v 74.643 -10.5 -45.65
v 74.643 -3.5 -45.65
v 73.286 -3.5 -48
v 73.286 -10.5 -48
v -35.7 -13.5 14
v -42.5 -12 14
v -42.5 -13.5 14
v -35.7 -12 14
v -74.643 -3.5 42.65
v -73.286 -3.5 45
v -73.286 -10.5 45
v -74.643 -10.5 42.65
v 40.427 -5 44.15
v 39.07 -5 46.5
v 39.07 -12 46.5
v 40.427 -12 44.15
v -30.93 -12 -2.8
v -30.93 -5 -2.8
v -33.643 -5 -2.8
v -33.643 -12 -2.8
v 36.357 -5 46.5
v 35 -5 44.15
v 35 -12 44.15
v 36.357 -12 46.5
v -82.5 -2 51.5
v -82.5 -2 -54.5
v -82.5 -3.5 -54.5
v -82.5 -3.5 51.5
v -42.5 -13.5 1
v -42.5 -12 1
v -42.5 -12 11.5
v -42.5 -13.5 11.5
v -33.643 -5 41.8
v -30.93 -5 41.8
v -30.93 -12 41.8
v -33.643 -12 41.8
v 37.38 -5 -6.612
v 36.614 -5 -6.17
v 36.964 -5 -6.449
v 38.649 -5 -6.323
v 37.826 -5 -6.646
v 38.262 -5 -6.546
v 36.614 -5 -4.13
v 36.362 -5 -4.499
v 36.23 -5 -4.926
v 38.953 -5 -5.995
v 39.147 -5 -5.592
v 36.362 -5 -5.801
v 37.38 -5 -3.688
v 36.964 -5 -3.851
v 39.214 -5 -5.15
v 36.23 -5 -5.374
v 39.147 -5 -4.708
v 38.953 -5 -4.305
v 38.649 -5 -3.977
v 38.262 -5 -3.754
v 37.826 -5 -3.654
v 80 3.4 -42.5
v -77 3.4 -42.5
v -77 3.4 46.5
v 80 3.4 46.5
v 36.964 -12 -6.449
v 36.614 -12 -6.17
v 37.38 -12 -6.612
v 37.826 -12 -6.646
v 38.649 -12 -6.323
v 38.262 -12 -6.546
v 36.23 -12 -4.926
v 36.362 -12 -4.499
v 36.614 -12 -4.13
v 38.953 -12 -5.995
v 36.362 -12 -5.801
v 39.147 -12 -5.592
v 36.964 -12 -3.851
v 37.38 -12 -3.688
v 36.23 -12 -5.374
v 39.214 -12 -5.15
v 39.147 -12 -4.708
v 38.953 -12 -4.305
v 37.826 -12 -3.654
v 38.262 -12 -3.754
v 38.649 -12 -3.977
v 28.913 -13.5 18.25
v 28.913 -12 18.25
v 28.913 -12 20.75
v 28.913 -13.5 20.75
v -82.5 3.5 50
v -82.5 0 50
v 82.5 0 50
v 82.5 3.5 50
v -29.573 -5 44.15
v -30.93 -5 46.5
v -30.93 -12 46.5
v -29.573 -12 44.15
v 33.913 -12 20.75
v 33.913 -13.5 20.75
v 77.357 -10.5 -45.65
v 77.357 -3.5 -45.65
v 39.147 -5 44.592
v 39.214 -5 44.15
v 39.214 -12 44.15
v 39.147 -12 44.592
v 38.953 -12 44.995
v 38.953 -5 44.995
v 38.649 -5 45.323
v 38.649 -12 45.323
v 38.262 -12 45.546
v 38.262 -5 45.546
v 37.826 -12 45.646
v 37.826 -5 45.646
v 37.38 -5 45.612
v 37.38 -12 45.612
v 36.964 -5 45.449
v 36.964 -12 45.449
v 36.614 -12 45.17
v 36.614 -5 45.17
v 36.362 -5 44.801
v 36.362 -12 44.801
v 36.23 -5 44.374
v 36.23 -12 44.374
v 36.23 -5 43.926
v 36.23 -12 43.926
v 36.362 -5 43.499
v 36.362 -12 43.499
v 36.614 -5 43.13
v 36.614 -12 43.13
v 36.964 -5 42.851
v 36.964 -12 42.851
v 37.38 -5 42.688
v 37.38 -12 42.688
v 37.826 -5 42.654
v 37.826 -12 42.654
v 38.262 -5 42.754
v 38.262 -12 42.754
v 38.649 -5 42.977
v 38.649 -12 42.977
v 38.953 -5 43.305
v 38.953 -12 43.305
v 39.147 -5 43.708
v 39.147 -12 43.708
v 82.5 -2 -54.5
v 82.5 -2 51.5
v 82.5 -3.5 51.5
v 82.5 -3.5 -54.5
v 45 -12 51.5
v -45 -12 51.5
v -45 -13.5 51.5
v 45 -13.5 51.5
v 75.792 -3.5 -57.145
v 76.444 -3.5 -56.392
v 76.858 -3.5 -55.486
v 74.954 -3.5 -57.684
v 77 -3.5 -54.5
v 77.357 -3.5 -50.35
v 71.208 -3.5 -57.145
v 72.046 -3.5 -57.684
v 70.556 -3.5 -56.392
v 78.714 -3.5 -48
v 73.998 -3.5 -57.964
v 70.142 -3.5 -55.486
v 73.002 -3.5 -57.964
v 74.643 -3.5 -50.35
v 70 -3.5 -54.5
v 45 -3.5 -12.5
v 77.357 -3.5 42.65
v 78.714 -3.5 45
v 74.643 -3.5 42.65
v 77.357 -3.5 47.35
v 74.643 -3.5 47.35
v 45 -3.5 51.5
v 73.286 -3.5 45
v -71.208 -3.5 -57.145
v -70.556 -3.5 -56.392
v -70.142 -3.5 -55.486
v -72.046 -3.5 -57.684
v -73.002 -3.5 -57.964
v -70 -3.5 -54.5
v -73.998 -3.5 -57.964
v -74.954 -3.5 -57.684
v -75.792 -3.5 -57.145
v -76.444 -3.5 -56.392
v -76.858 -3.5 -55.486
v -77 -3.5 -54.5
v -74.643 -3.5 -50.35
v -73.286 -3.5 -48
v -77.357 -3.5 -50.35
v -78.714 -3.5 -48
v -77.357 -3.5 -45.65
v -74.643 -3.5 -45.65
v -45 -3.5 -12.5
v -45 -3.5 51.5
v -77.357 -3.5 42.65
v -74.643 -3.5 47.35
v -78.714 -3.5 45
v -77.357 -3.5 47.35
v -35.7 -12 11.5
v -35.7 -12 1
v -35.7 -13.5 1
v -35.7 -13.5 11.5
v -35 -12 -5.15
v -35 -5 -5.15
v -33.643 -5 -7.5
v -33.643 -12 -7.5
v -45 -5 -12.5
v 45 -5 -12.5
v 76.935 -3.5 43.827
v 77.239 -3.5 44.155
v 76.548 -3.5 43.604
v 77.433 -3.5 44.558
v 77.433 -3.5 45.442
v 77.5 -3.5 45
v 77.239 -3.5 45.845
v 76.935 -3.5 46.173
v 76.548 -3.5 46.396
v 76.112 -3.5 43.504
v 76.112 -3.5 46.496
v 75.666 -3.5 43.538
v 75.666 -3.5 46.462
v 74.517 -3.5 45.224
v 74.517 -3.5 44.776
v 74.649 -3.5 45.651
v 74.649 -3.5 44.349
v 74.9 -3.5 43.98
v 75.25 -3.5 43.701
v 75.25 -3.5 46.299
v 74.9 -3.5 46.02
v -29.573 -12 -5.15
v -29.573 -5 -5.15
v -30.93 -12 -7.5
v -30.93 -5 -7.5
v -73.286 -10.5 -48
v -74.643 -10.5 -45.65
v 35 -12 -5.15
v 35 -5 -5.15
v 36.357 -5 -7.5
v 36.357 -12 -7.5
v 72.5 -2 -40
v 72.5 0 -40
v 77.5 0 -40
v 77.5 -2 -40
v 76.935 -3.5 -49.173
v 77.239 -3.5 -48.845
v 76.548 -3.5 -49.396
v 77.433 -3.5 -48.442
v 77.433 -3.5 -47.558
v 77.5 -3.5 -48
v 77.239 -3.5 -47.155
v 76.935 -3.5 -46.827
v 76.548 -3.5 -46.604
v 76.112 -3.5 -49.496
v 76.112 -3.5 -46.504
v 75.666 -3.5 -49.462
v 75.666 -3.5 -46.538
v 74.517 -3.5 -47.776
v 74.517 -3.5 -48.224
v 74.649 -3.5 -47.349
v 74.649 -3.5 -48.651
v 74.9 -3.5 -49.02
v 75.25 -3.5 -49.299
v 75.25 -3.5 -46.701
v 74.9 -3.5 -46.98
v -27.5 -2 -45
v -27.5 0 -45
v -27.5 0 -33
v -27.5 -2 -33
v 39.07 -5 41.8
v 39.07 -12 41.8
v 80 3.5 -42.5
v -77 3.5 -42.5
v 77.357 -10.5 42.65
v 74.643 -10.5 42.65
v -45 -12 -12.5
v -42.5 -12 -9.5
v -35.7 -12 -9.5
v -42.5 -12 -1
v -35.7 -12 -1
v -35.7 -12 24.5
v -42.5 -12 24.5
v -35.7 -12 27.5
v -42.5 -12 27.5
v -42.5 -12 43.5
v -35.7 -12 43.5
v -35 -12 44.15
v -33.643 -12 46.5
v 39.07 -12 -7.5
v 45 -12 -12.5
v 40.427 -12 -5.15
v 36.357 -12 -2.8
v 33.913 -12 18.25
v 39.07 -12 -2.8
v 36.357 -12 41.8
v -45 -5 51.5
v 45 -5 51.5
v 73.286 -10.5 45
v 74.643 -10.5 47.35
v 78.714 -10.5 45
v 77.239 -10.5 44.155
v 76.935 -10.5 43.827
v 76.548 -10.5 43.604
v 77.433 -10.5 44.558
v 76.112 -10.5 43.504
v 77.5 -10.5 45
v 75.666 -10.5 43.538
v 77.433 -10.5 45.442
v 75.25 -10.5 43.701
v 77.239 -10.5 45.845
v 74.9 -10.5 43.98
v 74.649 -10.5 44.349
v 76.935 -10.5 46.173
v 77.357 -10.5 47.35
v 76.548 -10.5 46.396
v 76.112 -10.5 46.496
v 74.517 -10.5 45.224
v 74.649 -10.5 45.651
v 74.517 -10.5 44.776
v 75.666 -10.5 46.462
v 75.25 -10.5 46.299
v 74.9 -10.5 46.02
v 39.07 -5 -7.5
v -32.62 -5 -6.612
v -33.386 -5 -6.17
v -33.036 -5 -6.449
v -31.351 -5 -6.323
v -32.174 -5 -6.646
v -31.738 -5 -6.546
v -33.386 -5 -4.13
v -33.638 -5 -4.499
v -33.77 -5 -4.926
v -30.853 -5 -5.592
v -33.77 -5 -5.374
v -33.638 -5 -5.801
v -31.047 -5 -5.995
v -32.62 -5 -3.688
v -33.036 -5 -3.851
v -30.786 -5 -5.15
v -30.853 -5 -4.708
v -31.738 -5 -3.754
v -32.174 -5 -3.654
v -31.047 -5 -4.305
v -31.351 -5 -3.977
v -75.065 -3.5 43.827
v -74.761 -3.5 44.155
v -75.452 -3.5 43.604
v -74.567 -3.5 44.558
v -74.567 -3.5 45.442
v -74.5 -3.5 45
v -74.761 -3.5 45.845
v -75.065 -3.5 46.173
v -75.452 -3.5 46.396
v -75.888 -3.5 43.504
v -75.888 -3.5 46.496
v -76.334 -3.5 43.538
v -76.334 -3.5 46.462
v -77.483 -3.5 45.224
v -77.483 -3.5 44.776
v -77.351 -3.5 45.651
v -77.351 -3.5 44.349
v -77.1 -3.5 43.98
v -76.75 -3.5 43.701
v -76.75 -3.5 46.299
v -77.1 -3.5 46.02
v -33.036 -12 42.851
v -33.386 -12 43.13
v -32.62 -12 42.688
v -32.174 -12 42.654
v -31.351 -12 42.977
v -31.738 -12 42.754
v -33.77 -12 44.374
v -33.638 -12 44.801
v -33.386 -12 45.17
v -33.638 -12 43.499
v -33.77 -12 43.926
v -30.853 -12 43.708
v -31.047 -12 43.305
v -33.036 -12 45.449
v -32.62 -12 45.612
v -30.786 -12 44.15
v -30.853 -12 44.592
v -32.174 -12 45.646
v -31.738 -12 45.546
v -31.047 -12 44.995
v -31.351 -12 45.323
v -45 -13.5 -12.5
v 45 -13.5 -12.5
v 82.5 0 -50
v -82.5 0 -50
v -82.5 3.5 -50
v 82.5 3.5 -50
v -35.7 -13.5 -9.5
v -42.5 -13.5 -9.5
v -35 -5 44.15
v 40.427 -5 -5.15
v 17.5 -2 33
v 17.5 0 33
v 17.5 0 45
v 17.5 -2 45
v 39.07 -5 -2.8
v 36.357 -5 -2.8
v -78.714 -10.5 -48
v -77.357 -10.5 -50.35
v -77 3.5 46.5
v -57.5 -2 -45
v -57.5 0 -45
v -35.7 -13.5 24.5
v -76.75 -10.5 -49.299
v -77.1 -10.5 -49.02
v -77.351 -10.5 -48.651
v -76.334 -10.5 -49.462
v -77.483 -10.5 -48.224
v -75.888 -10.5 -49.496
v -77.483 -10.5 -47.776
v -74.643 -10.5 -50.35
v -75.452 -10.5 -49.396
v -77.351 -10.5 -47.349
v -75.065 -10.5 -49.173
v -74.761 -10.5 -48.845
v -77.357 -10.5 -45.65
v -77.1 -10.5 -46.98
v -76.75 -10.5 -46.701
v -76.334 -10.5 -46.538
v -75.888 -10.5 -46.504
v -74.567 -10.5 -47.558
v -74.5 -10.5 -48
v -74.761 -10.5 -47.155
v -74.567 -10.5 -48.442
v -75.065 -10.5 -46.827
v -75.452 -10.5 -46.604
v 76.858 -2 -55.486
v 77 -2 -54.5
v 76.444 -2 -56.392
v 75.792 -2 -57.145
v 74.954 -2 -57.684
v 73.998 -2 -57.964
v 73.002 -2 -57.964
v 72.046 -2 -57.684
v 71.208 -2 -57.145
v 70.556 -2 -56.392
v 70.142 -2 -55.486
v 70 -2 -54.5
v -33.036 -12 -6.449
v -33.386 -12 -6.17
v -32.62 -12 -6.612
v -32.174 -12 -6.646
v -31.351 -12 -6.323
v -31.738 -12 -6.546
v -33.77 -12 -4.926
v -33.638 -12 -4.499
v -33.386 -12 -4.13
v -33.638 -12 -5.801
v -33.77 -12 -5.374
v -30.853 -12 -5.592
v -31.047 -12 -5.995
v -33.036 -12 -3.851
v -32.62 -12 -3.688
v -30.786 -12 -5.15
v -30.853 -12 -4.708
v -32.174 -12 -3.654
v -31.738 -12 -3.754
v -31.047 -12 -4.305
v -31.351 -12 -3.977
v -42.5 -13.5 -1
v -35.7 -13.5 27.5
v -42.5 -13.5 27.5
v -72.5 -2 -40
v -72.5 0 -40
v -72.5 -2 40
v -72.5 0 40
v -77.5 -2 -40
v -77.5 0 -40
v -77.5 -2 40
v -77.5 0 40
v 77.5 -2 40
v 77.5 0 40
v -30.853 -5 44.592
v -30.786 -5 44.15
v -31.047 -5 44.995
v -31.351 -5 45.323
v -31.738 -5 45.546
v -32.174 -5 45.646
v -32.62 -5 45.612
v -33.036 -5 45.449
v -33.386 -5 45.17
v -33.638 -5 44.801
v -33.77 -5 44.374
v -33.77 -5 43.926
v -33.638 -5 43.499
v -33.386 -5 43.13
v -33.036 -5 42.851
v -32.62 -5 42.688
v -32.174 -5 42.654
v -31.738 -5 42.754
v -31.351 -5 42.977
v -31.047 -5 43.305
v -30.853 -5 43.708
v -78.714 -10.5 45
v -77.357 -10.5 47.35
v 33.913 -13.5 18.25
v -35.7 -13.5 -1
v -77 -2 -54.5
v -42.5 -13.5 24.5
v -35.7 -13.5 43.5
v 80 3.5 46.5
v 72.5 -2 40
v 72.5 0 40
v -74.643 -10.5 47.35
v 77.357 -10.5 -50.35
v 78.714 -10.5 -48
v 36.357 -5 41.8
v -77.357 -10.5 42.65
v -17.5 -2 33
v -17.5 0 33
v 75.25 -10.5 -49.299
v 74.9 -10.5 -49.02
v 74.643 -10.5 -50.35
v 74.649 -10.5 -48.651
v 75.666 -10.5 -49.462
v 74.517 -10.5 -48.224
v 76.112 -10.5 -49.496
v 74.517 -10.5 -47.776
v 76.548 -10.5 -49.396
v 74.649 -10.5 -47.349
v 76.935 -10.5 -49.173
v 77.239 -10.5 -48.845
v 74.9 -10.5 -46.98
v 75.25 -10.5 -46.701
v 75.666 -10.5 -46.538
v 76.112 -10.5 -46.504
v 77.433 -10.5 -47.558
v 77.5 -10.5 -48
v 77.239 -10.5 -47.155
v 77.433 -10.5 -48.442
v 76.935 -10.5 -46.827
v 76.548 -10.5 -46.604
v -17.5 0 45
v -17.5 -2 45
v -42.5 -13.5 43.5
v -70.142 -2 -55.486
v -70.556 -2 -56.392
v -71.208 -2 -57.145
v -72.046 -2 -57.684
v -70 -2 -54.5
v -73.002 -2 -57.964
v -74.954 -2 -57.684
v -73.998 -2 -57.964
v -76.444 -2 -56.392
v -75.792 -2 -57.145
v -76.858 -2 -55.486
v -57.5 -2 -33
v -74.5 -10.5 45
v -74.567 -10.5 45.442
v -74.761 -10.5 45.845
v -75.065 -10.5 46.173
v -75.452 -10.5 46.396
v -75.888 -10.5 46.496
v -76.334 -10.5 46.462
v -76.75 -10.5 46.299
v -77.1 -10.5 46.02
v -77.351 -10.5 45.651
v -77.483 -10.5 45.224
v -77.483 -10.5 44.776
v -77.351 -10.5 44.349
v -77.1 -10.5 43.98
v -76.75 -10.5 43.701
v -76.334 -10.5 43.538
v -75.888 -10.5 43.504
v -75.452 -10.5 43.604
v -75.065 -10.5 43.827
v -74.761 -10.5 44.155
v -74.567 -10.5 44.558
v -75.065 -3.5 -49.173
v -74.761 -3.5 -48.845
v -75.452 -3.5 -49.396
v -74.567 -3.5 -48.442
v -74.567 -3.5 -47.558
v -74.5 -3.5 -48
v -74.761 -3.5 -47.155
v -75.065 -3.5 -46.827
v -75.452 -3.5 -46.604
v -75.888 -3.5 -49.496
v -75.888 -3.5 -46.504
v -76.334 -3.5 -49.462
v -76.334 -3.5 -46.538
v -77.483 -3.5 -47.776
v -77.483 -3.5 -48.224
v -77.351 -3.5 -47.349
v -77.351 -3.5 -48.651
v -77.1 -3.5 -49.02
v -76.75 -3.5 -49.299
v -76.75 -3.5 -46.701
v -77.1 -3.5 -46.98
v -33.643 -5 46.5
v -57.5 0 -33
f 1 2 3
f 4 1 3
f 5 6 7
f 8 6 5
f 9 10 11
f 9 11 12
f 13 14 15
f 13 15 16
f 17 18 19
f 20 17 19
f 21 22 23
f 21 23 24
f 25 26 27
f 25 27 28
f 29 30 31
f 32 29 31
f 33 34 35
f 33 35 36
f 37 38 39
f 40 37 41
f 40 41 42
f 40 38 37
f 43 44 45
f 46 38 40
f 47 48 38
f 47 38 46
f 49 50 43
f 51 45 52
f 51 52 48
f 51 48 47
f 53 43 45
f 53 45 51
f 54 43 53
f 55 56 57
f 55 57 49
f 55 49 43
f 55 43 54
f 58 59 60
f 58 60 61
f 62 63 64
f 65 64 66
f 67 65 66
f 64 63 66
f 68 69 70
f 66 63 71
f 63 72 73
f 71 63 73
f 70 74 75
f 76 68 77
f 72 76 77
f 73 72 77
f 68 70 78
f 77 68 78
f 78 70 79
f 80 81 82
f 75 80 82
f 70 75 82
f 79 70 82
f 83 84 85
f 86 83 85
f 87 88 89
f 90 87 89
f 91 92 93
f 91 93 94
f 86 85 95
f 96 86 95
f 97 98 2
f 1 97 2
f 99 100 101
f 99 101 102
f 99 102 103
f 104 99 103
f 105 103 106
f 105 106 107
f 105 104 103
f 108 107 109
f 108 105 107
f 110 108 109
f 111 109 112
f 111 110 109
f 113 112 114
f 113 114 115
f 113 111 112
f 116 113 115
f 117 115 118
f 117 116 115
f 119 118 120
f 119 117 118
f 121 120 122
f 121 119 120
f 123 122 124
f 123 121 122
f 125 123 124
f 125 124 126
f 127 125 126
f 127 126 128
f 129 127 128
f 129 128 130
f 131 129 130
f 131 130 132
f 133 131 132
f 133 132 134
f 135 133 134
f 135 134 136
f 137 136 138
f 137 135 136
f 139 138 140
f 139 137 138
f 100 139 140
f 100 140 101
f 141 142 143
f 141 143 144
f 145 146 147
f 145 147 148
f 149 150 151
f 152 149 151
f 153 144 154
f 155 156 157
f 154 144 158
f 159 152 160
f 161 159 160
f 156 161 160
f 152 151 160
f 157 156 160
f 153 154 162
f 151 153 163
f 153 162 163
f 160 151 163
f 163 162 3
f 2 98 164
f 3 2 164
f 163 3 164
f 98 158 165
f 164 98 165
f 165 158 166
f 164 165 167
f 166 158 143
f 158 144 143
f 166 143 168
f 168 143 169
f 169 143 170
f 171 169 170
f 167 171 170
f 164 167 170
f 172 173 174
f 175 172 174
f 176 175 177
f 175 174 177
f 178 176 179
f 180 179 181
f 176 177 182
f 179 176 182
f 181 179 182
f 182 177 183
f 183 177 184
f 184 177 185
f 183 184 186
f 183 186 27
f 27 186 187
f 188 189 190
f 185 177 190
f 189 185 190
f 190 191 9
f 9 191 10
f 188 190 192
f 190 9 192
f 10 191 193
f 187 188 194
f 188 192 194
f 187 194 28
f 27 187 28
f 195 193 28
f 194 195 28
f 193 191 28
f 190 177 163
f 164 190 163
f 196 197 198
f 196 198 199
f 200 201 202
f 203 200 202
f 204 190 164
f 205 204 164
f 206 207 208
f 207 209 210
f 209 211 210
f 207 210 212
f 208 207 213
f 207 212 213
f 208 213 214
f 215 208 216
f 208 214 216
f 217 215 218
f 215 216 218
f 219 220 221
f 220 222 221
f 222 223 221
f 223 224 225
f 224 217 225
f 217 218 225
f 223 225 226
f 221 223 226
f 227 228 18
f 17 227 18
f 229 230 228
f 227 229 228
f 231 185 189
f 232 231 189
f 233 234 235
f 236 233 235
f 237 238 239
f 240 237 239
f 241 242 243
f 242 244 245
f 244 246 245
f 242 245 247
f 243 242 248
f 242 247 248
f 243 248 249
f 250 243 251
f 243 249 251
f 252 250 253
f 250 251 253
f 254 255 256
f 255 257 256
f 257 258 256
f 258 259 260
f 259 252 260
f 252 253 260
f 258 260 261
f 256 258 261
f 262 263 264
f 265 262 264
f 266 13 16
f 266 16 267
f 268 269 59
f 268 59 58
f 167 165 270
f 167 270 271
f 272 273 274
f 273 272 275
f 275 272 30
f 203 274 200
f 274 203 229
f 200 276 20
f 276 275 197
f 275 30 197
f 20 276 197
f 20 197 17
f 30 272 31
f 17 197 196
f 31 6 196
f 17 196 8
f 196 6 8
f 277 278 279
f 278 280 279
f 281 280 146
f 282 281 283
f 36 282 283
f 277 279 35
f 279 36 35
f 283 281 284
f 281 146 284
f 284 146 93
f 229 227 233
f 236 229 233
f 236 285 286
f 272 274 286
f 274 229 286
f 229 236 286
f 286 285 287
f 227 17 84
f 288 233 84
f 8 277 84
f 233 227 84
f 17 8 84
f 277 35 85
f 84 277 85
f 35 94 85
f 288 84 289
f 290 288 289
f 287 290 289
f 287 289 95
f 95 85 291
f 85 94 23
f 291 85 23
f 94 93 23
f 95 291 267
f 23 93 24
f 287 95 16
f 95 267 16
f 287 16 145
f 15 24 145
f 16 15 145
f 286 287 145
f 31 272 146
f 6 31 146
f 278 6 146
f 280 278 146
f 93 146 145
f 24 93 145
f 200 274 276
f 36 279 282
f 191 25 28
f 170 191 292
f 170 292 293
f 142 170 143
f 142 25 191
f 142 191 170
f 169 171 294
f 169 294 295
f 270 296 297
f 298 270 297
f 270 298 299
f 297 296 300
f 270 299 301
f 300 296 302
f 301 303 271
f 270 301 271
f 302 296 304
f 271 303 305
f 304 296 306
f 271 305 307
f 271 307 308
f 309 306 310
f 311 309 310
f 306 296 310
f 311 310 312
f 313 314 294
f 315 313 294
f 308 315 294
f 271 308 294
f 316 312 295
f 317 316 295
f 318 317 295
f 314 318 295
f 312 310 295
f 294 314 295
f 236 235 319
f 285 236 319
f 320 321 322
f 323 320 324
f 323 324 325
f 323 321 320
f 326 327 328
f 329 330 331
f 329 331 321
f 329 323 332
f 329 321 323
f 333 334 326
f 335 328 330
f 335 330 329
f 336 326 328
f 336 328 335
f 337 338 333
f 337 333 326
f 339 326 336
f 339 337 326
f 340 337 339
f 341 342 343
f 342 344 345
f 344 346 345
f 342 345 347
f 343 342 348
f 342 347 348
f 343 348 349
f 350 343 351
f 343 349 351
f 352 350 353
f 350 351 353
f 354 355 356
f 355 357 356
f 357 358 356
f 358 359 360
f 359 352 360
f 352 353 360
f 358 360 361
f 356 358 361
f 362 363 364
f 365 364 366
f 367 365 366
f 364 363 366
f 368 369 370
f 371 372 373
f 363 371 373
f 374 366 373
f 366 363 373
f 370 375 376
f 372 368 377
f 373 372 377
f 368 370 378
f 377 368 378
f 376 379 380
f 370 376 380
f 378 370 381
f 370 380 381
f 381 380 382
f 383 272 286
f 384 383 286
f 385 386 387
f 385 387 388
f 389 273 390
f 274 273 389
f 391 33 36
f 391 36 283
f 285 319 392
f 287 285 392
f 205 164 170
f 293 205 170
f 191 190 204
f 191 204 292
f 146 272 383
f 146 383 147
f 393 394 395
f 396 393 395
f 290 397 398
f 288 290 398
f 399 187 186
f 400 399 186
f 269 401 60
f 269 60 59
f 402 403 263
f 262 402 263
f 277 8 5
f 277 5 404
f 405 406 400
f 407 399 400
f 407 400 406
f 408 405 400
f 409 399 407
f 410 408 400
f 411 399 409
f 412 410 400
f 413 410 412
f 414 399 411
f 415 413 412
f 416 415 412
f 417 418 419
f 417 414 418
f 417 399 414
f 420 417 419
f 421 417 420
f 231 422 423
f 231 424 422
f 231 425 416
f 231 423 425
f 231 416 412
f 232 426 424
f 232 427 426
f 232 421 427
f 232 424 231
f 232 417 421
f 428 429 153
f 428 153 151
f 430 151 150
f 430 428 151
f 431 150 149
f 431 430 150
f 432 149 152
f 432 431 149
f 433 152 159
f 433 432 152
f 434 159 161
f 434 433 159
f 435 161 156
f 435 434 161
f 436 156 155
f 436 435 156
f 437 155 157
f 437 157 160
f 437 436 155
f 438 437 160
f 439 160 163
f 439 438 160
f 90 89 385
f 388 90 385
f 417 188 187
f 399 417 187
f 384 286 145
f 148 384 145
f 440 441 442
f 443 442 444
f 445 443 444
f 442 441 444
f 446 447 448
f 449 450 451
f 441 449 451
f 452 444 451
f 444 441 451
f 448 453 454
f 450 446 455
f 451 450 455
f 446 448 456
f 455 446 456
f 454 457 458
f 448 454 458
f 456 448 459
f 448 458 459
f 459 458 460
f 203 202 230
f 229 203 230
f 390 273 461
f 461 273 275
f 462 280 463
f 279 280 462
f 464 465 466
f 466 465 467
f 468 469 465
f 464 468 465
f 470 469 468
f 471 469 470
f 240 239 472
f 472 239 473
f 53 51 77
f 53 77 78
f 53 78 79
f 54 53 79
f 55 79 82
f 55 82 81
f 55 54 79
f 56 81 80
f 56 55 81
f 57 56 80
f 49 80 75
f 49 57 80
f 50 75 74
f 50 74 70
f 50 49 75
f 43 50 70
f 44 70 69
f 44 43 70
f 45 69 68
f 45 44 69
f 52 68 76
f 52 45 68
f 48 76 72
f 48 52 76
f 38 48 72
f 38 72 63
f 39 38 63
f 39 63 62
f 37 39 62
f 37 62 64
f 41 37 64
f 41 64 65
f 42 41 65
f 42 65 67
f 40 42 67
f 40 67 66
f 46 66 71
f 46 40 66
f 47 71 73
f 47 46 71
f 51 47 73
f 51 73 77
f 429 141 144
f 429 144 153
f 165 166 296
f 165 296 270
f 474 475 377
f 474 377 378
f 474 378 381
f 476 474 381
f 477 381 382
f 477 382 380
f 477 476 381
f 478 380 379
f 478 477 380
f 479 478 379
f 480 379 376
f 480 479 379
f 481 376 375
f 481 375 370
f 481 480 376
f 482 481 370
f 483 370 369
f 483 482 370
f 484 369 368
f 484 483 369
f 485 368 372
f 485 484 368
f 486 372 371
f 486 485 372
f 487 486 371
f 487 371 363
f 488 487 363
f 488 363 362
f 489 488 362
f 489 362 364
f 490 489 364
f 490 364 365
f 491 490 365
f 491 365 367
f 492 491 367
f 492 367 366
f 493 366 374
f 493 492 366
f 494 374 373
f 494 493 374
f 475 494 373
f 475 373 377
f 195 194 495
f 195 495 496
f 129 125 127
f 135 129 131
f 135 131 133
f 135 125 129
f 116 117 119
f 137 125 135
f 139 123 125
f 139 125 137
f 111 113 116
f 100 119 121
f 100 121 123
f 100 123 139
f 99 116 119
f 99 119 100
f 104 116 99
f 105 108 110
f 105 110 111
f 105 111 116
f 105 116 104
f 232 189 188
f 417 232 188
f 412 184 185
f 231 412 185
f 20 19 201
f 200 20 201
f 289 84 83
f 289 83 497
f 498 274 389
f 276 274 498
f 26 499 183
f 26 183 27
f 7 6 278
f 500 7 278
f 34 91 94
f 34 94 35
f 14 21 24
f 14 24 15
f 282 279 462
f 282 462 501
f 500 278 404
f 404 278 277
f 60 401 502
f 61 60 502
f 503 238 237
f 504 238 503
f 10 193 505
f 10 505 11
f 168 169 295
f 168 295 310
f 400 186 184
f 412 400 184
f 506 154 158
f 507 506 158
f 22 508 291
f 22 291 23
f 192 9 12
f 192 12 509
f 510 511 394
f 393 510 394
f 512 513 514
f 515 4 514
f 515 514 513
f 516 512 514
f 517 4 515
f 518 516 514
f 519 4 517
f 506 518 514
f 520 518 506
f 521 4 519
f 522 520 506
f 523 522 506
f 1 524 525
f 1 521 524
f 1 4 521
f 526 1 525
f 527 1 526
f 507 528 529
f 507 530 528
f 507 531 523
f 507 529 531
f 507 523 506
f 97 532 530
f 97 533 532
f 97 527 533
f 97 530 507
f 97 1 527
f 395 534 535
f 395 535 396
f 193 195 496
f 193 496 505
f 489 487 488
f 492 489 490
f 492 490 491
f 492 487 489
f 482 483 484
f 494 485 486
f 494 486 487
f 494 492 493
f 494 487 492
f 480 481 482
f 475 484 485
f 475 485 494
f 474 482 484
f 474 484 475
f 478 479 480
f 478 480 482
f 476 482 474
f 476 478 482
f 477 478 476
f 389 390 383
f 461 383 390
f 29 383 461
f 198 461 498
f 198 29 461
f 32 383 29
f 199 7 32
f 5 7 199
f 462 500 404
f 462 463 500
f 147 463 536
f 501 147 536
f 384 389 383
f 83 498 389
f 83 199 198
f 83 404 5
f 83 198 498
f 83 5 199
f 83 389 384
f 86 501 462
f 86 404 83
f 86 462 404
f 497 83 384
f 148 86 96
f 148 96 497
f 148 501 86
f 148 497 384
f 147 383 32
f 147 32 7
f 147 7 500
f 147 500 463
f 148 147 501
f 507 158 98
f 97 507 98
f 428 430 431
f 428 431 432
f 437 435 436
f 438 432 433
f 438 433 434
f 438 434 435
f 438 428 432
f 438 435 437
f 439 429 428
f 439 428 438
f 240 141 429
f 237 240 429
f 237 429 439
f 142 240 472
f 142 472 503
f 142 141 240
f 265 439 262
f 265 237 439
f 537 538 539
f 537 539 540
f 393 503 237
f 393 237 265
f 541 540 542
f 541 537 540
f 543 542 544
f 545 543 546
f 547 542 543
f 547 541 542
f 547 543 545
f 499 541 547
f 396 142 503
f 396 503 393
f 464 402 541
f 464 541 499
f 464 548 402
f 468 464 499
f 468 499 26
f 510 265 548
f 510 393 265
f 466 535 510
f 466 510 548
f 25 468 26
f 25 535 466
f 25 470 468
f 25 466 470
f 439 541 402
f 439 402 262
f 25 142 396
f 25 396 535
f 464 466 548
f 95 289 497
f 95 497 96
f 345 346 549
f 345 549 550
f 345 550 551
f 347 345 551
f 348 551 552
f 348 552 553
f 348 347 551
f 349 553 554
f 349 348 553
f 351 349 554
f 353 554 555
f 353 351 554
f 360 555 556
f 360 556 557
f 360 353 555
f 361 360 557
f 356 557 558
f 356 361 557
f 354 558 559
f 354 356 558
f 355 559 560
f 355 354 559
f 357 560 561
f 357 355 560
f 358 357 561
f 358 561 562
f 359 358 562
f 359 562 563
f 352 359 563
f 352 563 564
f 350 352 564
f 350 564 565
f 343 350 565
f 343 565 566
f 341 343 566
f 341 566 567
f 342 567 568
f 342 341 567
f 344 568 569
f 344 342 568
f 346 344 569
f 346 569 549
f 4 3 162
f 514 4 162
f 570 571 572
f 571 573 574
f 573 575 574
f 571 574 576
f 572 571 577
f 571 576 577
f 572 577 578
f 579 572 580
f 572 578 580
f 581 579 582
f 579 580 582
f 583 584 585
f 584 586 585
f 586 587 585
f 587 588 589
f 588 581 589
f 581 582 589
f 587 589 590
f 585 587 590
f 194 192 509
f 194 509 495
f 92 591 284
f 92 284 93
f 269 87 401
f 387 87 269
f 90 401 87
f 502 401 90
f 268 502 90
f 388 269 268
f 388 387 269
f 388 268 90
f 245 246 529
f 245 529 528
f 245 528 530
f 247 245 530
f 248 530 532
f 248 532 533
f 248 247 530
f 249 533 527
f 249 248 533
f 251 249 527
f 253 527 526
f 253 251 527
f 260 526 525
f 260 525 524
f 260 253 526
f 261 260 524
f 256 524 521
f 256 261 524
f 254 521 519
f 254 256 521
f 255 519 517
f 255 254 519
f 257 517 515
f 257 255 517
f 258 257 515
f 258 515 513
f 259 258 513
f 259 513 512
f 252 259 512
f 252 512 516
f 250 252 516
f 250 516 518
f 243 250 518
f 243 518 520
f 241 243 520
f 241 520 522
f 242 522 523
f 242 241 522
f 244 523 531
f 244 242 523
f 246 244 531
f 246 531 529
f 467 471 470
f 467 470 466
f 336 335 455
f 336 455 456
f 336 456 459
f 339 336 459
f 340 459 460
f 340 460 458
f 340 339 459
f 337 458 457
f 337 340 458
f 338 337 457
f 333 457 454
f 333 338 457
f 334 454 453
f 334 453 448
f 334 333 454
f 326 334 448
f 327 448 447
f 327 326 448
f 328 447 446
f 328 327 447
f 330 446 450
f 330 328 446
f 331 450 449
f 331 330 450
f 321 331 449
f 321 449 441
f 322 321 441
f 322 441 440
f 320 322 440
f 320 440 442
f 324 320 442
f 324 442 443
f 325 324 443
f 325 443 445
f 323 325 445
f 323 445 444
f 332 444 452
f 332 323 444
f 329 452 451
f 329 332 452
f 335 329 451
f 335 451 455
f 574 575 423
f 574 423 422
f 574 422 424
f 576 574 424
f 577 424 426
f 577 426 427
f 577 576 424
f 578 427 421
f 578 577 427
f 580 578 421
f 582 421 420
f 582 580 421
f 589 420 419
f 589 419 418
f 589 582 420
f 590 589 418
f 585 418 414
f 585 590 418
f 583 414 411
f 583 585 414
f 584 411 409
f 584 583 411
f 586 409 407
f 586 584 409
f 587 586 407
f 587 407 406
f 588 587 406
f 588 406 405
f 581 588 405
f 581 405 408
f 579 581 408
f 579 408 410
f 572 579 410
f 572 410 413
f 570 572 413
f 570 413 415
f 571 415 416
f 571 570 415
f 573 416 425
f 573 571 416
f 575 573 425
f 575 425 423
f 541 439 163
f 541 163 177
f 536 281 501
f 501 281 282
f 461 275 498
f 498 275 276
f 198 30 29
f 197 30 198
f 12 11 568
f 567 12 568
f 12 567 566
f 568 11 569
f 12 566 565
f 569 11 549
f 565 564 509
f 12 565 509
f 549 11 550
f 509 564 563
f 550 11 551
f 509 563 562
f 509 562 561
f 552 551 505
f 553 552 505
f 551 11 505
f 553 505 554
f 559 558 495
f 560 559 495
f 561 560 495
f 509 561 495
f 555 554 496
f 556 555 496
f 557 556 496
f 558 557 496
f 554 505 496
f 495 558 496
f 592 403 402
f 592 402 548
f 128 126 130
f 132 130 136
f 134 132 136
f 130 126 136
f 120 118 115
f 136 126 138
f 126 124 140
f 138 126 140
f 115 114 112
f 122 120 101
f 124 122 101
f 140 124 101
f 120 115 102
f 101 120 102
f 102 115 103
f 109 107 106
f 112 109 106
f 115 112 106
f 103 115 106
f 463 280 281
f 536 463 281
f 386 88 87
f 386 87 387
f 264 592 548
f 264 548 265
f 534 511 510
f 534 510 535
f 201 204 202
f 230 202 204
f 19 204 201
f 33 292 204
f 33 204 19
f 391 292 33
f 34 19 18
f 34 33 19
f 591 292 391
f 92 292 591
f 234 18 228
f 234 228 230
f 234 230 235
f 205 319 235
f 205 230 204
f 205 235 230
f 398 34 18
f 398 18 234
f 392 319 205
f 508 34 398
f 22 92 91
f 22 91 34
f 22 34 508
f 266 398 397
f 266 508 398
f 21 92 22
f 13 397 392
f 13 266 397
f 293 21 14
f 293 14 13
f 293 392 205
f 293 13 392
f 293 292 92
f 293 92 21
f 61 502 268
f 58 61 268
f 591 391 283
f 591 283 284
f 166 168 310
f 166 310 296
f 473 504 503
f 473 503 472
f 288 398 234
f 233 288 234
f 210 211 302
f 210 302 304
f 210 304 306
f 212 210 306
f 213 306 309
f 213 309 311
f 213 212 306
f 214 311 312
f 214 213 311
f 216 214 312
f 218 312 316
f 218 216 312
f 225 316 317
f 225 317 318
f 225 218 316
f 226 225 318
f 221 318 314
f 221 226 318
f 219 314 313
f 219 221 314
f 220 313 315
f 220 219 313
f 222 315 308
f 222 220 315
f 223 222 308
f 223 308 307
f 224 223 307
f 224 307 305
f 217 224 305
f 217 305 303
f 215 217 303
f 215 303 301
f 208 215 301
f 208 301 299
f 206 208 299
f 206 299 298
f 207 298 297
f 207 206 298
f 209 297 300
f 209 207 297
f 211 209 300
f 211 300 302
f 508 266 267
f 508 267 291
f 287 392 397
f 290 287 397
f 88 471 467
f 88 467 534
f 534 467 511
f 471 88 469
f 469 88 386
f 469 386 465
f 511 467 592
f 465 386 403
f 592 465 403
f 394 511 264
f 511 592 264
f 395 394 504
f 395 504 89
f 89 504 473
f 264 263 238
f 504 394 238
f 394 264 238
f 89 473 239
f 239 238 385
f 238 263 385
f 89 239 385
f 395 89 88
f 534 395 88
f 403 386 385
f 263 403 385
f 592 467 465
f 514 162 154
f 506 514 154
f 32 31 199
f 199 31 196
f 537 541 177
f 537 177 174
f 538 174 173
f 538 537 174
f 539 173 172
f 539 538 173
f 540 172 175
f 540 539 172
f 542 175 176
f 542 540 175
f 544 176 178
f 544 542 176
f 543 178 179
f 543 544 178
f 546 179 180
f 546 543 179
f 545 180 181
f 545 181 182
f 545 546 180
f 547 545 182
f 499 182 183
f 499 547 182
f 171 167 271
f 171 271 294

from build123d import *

# Parameters (mm, degrees)
SKETCH_1_W          = 165
SKETCH_1_H          = 100
EXTRUDE_1_DEPTH     = 3.5
SKETCH_2_W          = 35
SKETCH_2_H          = 12
SKETCH_2_W_2        = 5
SKETCH_2_H_2        = 80
SKETCH_2_W_3        = 30
EXTRUDE_2_DEPTH     = 2
EXTRUDE_3_DEPTH     = 1.5
SKETCH_4_W          = 90
SKETCH_4_H          = 64
EXTRUDE_4_DEPTH     = 1.5
SKETCH_5_R          = 1.5
EXTRUDE_5_DEPTH     = 7
SKETCH_6_W          = 90
SKETCH_6_H          = 64
SKETCH_6_W_2        = 6.8
SKETCH_6_H_2        = 16
SKETCH_6_H_3        = 10.5
SKETCH_6_H_4        = 8.5
SKETCH_6_W_3        = 5
SKETCH_6_H_5        = 2.5
EXTRUDE_6_DEPTH     = 1.5
SKETCH_7_R          = 1.5
EXTRUDE_7_DEPTH     = 7
SKETCH_8_W          = 157
SKETCH_8_H          = 89
CUT_EXTRUDE_1_DEPTH = 0.1


with BuildPart() as part:
    # 草图1 → 凸台-拉伸1 (new body)
    with BuildSketch(Plane(origin=(0, 0, 0), x_dir=(1, 0, 0), z_dir=(0, 1, 0))):
        Rectangle(SKETCH_1_W, SKETCH_1_H)
    extrude(amount=EXTRUDE_1_DEPTH)

    # 草图2 → 凸台-拉伸2 (add)
    with BuildSketch(Plane.XZ):
        with Locations((0, 39)):
            Rectangle(SKETCH_2_W, SKETCH_2_H)
        with Locations((-75, 0)):
            Rectangle(SKETCH_2_W_2, SKETCH_2_H_2)
        with Locations((75, 0)):
            Rectangle(SKETCH_2_W_2, SKETCH_2_H_2)
        with Locations((-42.5, -39)):
            Rectangle(SKETCH_2_W_3, SKETCH_2_H)
    extrude(amount=EXTRUDE_2_DEPTH)

    # 草图3 → 凸台-拉伸3 (add)
    with BuildSketch(Plane.XZ.offset(2)):
        with BuildLine():
            Line((82.5, -54.5), (77, -54.5))
            ThreePointArc((77, -54.5), (73.5, -58), (70, -54.5))
            Line((70, -54.5), (-70, -54.5))
            ThreePointArc((-70, -54.5), (-73.5, -58), (-77, -54.5))
            Line((-77, -54.5), (-82.5, -54.5))
            Line((-82.5, -54.5), (-82.5, 51.5))
            Line((-82.5, 51.5), (82.5, 51.5))
            Line((82.5, 51.5), (82.5, -54.5))
        make_face()
    extrude(amount=EXTRUDE_3_DEPTH)

    # 草图4 → 凸台-拉伸4 (add)
    with BuildSketch(Plane.XZ.offset(3.5)):
        with Locations((0, 19.5)):
            Rectangle(SKETCH_4_W, SKETCH_4_H)
    extrude(amount=EXTRUDE_4_DEPTH)

    # 草图5 → 凸台-拉伸5 (add)
    with BuildSketch(Plane.XZ.offset(5)):
        Polygon((-33.643226867, 46.5), (-30.929680602, 46.5), (-29.57290747, 44.15), (-30.929680602, 41.8), (-33.643226867, 41.8), (-35, 44.15), align=None)
        with Locations((-32.286453735, 44.15)):
            Circle(SKETCH_5_R, mode=Mode.SUBTRACT)
        Polygon((35, 44.15), (36.356773133, 46.5), (39.070319398, 46.5), (40.42709253, 44.15), (39.070319398, 41.8), (36.356773133, 41.8), align=None)
        with Locations((37.713546265, 44.15)):
            Circle(SKETCH_5_R, mode=Mode.SUBTRACT)
        Polygon((36.356773133, -2.8), (35, -5.15), (36.356773133, -7.5), (39.070319398, -7.5), (40.42709253, -5.15), (39.070319398, -2.8), align=None)
        with Locations((37.713546265, -5.15)):
            Circle(SKETCH_5_R, mode=Mode.SUBTRACT)
        Polygon((-33.643226867, -2.8), (-35, -5.15), (-33.643226867, -7.5), (-30.929680602, -7.5), (-29.57290747, -5.15), (-30.929680602, -2.8), align=None)
        with Locations((-32.286453735, -5.15)):
            Circle(SKETCH_5_R, mode=Mode.SUBTRACT)
    extrude(amount=EXTRUDE_5_DEPTH)

    # 草图6 → 凸台-拉伸6 (add)
    with BuildSketch(Plane.XZ.offset(12)):
        with Locations((0, 19.5)):
            Rectangle(SKETCH_6_W, SKETCH_6_H)
        with Locations((-39.1, 35.5)):
            Rectangle(SKETCH_6_W_2, SKETCH_6_H_2, mode=Mode.SUBTRACT)
        with Locations((-39.1, 19.25)):
            Rectangle(SKETCH_6_W_2, SKETCH_6_H_3, mode=Mode.SUBTRACT)
        with Locations((-39.1, 6.25)):
            Rectangle(SKETCH_6_W_2, SKETCH_6_H_3, mode=Mode.SUBTRACT)
        with Locations((-39.1, -5.25)):
            Rectangle(SKETCH_6_W_2, SKETCH_6_H_4, mode=Mode.SUBTRACT)
        with Locations((31.412593709, 19.5)):
            Rectangle(SKETCH_6_W_3, SKETCH_6_H_5, mode=Mode.SUBTRACT)
    extrude(amount=EXTRUDE_6_DEPTH)

    # 草图7 → 凸台-拉伸7 (add)
    with BuildSketch(Plane.XZ.offset(3.5)):
        Polygon((-77.356773133, 47.35), (-74.643226867, 47.35), (-73.286453735, 45), (-74.643226867, 42.65), (-77.356773133, 42.65), (-78.713546265, 45), align=None)
        with Locations((-76, 45)):
            Circle(SKETCH_7_R, mode=Mode.SUBTRACT)
        Polygon((73.286453735, 45), (74.643226867, 47.35), (77.356773133, 47.35), (78.713546265, 45), (77.356773133, 42.65), (74.643226867, 42.65), align=None)
        with Locations((76, 45)):
            Circle(SKETCH_7_R, mode=Mode.SUBTRACT)
        Polygon((74.643226867, -45.65), (73.286453735, -48), (74.643226867, -50.35), (77.356773133, -50.35), (78.713546265, -48), (77.356773133, -45.65), align=None)
        with Locations((76, -48)):
            Circle(SKETCH_7_R, mode=Mode.SUBTRACT)
        Polygon((-77.356773133, -45.65), (-78.713546265, -48), (-77.356773133, -50.35), (-74.643226867, -50.35), (-73.286453735, -48), (-74.643226867, -45.65), align=None)
        with Locations((-76, -48)):
            Circle(SKETCH_7_R, mode=Mode.SUBTRACT)
    extrude(amount=EXTRUDE_7_DEPTH)

    # 草图8 → 切除-拉伸1 (cut)
    with BuildSketch(Plane(origin=(0, 3.5, 0), x_dir=(1, 0, 0), z_dir=(0, 1, 0))):
        with Locations((1.5, -2)):
            Rectangle(SKETCH_8_W, SKETCH_8_H)
    extrude(amount=-CUT_EXTRUDE_1_DEPTH, mode=Mode.SUBTRACT)


solid = part.part
